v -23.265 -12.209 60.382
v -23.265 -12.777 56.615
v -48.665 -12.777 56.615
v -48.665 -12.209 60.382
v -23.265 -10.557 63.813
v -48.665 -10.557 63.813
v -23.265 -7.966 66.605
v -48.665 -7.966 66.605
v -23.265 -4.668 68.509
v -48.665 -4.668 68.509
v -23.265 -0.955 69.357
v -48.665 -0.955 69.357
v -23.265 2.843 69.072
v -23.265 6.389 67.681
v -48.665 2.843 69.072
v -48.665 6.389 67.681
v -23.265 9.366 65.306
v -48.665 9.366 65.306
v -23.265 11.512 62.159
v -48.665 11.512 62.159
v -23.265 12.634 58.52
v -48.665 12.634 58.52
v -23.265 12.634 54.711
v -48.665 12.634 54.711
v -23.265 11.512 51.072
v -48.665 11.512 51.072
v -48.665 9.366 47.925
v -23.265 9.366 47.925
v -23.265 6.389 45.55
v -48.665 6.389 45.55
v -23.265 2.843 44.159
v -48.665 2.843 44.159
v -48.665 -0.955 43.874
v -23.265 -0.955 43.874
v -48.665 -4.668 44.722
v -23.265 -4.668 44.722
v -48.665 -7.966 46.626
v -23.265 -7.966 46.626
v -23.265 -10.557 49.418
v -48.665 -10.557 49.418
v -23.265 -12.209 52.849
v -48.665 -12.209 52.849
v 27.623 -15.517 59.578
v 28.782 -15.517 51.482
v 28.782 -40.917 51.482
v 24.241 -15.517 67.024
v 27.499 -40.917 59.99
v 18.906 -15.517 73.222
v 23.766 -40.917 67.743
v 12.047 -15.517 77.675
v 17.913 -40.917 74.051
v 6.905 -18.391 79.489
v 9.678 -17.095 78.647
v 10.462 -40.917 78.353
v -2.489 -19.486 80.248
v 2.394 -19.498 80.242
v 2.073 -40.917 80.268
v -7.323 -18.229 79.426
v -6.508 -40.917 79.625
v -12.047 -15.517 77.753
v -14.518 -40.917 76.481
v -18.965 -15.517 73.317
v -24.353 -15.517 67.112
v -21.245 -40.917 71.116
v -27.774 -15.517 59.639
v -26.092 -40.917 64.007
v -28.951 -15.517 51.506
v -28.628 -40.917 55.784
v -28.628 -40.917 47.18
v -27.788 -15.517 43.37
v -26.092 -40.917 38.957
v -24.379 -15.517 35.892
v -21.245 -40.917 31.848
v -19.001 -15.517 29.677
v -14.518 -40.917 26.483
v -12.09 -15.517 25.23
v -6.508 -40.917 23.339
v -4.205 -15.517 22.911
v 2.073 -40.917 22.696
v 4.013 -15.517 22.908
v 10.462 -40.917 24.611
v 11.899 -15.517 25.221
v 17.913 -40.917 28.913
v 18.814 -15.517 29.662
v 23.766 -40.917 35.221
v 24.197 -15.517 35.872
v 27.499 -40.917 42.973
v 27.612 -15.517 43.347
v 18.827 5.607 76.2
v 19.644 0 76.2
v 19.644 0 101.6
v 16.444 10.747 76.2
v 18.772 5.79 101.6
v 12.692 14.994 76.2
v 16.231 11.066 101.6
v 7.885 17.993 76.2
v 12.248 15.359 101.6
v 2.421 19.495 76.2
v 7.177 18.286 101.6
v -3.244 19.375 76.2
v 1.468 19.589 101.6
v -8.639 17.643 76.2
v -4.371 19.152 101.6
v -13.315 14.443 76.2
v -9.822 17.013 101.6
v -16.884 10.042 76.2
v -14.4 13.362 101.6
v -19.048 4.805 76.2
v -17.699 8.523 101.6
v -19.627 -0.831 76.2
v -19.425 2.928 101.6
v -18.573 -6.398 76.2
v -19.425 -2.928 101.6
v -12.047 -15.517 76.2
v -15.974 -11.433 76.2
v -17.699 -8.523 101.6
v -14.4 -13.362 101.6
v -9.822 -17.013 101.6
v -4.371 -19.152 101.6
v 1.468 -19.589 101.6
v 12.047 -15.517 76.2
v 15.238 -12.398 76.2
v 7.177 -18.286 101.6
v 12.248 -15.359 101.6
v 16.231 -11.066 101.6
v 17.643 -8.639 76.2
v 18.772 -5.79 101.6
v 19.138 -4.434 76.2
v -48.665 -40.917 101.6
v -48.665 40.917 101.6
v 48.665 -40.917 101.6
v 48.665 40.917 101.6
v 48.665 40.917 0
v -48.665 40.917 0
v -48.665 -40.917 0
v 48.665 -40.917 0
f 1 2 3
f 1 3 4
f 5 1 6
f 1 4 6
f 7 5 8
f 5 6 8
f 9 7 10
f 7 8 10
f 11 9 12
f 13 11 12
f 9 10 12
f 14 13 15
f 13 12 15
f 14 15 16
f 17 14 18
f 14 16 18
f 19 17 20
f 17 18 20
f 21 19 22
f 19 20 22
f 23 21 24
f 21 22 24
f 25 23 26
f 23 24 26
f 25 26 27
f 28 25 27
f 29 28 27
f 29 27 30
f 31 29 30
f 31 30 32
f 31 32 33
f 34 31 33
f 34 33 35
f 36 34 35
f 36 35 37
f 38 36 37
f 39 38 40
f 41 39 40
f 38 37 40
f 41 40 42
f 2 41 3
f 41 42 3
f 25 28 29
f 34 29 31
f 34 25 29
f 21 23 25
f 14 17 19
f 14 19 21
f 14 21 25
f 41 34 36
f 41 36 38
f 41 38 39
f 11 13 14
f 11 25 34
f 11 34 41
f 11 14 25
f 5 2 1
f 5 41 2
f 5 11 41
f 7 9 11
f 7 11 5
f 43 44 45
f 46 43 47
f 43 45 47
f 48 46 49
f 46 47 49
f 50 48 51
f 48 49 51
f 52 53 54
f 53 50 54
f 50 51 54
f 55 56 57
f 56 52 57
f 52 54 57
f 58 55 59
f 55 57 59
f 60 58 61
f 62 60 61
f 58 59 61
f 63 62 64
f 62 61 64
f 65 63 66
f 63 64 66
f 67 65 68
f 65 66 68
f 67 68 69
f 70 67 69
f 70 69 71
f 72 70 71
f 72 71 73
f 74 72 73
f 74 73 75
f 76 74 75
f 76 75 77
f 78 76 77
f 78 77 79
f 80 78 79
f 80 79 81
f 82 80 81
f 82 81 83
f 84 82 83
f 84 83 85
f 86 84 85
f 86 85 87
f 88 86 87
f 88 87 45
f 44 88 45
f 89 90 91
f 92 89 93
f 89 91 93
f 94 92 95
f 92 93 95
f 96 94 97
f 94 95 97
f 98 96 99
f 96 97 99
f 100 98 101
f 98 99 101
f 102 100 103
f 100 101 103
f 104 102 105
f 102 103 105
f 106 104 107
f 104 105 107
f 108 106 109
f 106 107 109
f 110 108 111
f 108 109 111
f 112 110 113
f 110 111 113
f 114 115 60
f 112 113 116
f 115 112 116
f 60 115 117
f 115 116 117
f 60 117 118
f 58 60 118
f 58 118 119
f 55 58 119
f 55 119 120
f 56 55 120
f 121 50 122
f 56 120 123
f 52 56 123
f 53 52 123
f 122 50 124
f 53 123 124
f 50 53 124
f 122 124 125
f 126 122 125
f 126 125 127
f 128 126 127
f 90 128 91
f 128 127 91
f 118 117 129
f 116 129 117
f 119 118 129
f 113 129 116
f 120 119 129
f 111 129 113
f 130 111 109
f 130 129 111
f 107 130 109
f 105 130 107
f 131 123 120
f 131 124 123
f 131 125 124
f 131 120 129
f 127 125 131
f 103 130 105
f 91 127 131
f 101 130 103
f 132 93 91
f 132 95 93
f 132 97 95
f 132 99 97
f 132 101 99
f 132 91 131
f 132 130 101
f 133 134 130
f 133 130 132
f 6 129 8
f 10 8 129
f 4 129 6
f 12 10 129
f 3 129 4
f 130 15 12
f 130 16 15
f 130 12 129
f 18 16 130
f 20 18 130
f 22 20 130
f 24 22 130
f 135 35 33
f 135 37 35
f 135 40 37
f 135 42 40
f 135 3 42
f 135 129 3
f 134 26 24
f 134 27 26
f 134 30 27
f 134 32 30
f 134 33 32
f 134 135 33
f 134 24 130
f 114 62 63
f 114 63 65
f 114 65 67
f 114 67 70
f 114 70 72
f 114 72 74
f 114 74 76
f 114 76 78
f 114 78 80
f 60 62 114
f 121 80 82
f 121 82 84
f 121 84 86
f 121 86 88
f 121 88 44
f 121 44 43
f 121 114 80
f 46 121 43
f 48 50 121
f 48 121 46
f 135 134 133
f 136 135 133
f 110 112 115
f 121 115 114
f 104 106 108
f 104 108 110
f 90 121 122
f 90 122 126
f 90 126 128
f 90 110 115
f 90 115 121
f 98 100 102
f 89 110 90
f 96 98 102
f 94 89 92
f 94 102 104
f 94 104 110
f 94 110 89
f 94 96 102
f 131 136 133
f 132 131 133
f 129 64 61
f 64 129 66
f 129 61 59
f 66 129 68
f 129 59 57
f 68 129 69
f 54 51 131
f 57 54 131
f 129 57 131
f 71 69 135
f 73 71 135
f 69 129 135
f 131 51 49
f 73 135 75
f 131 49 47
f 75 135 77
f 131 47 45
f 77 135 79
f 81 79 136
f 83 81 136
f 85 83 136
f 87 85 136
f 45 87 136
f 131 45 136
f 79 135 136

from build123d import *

# Parameters (mm, degrees)
F0_W     = 97.3299
F0_H     = 81.834436
F1_DEPTH = 101.6
F2_R     = 19.644425
F3_DEPTH = 25.4
F5_R     = 12.777111
F6_DEPTH = 25.4
F4_R     = 28.866366
F7_DEPTH = 25.4


with BuildPart() as f1:
    # F0 (on Top) → F1 (new body)
    with BuildSketch(Plane.XY):
        Rectangle(F0_W, F0_H)
    extrude(amount=F1_DEPTH)

    # F2 (on face) → F3 (cut)
    with BuildSketch(Plane.XY.offset(101.6)):
        Circle(F2_R)
    extrude(amount=-F3_DEPTH, mode=Mode.SUBTRACT)

    # F5 (on face) → F6 (cut)
    with BuildSketch(Plane(origin=(-48.66495, 0, 0), x_dir=(0, -1, 0), z_dir=(-1, 0, 0))):
        with Locations((0, 56.615394)):
            Circle(F5_R)
    extrude(amount=-F6_DEPTH, mode=Mode.SUBTRACT)

    # F4 (on face) → F7 (cut)
    with BuildSketch(Plane.XZ.offset(40.917218)):
        with Locations((-0.084508, 51.481884)):
            Circle(F4_R)
    extrude(amount=-F7_DEPTH, mode=Mode.SUBTRACT)


solid = f1.part
